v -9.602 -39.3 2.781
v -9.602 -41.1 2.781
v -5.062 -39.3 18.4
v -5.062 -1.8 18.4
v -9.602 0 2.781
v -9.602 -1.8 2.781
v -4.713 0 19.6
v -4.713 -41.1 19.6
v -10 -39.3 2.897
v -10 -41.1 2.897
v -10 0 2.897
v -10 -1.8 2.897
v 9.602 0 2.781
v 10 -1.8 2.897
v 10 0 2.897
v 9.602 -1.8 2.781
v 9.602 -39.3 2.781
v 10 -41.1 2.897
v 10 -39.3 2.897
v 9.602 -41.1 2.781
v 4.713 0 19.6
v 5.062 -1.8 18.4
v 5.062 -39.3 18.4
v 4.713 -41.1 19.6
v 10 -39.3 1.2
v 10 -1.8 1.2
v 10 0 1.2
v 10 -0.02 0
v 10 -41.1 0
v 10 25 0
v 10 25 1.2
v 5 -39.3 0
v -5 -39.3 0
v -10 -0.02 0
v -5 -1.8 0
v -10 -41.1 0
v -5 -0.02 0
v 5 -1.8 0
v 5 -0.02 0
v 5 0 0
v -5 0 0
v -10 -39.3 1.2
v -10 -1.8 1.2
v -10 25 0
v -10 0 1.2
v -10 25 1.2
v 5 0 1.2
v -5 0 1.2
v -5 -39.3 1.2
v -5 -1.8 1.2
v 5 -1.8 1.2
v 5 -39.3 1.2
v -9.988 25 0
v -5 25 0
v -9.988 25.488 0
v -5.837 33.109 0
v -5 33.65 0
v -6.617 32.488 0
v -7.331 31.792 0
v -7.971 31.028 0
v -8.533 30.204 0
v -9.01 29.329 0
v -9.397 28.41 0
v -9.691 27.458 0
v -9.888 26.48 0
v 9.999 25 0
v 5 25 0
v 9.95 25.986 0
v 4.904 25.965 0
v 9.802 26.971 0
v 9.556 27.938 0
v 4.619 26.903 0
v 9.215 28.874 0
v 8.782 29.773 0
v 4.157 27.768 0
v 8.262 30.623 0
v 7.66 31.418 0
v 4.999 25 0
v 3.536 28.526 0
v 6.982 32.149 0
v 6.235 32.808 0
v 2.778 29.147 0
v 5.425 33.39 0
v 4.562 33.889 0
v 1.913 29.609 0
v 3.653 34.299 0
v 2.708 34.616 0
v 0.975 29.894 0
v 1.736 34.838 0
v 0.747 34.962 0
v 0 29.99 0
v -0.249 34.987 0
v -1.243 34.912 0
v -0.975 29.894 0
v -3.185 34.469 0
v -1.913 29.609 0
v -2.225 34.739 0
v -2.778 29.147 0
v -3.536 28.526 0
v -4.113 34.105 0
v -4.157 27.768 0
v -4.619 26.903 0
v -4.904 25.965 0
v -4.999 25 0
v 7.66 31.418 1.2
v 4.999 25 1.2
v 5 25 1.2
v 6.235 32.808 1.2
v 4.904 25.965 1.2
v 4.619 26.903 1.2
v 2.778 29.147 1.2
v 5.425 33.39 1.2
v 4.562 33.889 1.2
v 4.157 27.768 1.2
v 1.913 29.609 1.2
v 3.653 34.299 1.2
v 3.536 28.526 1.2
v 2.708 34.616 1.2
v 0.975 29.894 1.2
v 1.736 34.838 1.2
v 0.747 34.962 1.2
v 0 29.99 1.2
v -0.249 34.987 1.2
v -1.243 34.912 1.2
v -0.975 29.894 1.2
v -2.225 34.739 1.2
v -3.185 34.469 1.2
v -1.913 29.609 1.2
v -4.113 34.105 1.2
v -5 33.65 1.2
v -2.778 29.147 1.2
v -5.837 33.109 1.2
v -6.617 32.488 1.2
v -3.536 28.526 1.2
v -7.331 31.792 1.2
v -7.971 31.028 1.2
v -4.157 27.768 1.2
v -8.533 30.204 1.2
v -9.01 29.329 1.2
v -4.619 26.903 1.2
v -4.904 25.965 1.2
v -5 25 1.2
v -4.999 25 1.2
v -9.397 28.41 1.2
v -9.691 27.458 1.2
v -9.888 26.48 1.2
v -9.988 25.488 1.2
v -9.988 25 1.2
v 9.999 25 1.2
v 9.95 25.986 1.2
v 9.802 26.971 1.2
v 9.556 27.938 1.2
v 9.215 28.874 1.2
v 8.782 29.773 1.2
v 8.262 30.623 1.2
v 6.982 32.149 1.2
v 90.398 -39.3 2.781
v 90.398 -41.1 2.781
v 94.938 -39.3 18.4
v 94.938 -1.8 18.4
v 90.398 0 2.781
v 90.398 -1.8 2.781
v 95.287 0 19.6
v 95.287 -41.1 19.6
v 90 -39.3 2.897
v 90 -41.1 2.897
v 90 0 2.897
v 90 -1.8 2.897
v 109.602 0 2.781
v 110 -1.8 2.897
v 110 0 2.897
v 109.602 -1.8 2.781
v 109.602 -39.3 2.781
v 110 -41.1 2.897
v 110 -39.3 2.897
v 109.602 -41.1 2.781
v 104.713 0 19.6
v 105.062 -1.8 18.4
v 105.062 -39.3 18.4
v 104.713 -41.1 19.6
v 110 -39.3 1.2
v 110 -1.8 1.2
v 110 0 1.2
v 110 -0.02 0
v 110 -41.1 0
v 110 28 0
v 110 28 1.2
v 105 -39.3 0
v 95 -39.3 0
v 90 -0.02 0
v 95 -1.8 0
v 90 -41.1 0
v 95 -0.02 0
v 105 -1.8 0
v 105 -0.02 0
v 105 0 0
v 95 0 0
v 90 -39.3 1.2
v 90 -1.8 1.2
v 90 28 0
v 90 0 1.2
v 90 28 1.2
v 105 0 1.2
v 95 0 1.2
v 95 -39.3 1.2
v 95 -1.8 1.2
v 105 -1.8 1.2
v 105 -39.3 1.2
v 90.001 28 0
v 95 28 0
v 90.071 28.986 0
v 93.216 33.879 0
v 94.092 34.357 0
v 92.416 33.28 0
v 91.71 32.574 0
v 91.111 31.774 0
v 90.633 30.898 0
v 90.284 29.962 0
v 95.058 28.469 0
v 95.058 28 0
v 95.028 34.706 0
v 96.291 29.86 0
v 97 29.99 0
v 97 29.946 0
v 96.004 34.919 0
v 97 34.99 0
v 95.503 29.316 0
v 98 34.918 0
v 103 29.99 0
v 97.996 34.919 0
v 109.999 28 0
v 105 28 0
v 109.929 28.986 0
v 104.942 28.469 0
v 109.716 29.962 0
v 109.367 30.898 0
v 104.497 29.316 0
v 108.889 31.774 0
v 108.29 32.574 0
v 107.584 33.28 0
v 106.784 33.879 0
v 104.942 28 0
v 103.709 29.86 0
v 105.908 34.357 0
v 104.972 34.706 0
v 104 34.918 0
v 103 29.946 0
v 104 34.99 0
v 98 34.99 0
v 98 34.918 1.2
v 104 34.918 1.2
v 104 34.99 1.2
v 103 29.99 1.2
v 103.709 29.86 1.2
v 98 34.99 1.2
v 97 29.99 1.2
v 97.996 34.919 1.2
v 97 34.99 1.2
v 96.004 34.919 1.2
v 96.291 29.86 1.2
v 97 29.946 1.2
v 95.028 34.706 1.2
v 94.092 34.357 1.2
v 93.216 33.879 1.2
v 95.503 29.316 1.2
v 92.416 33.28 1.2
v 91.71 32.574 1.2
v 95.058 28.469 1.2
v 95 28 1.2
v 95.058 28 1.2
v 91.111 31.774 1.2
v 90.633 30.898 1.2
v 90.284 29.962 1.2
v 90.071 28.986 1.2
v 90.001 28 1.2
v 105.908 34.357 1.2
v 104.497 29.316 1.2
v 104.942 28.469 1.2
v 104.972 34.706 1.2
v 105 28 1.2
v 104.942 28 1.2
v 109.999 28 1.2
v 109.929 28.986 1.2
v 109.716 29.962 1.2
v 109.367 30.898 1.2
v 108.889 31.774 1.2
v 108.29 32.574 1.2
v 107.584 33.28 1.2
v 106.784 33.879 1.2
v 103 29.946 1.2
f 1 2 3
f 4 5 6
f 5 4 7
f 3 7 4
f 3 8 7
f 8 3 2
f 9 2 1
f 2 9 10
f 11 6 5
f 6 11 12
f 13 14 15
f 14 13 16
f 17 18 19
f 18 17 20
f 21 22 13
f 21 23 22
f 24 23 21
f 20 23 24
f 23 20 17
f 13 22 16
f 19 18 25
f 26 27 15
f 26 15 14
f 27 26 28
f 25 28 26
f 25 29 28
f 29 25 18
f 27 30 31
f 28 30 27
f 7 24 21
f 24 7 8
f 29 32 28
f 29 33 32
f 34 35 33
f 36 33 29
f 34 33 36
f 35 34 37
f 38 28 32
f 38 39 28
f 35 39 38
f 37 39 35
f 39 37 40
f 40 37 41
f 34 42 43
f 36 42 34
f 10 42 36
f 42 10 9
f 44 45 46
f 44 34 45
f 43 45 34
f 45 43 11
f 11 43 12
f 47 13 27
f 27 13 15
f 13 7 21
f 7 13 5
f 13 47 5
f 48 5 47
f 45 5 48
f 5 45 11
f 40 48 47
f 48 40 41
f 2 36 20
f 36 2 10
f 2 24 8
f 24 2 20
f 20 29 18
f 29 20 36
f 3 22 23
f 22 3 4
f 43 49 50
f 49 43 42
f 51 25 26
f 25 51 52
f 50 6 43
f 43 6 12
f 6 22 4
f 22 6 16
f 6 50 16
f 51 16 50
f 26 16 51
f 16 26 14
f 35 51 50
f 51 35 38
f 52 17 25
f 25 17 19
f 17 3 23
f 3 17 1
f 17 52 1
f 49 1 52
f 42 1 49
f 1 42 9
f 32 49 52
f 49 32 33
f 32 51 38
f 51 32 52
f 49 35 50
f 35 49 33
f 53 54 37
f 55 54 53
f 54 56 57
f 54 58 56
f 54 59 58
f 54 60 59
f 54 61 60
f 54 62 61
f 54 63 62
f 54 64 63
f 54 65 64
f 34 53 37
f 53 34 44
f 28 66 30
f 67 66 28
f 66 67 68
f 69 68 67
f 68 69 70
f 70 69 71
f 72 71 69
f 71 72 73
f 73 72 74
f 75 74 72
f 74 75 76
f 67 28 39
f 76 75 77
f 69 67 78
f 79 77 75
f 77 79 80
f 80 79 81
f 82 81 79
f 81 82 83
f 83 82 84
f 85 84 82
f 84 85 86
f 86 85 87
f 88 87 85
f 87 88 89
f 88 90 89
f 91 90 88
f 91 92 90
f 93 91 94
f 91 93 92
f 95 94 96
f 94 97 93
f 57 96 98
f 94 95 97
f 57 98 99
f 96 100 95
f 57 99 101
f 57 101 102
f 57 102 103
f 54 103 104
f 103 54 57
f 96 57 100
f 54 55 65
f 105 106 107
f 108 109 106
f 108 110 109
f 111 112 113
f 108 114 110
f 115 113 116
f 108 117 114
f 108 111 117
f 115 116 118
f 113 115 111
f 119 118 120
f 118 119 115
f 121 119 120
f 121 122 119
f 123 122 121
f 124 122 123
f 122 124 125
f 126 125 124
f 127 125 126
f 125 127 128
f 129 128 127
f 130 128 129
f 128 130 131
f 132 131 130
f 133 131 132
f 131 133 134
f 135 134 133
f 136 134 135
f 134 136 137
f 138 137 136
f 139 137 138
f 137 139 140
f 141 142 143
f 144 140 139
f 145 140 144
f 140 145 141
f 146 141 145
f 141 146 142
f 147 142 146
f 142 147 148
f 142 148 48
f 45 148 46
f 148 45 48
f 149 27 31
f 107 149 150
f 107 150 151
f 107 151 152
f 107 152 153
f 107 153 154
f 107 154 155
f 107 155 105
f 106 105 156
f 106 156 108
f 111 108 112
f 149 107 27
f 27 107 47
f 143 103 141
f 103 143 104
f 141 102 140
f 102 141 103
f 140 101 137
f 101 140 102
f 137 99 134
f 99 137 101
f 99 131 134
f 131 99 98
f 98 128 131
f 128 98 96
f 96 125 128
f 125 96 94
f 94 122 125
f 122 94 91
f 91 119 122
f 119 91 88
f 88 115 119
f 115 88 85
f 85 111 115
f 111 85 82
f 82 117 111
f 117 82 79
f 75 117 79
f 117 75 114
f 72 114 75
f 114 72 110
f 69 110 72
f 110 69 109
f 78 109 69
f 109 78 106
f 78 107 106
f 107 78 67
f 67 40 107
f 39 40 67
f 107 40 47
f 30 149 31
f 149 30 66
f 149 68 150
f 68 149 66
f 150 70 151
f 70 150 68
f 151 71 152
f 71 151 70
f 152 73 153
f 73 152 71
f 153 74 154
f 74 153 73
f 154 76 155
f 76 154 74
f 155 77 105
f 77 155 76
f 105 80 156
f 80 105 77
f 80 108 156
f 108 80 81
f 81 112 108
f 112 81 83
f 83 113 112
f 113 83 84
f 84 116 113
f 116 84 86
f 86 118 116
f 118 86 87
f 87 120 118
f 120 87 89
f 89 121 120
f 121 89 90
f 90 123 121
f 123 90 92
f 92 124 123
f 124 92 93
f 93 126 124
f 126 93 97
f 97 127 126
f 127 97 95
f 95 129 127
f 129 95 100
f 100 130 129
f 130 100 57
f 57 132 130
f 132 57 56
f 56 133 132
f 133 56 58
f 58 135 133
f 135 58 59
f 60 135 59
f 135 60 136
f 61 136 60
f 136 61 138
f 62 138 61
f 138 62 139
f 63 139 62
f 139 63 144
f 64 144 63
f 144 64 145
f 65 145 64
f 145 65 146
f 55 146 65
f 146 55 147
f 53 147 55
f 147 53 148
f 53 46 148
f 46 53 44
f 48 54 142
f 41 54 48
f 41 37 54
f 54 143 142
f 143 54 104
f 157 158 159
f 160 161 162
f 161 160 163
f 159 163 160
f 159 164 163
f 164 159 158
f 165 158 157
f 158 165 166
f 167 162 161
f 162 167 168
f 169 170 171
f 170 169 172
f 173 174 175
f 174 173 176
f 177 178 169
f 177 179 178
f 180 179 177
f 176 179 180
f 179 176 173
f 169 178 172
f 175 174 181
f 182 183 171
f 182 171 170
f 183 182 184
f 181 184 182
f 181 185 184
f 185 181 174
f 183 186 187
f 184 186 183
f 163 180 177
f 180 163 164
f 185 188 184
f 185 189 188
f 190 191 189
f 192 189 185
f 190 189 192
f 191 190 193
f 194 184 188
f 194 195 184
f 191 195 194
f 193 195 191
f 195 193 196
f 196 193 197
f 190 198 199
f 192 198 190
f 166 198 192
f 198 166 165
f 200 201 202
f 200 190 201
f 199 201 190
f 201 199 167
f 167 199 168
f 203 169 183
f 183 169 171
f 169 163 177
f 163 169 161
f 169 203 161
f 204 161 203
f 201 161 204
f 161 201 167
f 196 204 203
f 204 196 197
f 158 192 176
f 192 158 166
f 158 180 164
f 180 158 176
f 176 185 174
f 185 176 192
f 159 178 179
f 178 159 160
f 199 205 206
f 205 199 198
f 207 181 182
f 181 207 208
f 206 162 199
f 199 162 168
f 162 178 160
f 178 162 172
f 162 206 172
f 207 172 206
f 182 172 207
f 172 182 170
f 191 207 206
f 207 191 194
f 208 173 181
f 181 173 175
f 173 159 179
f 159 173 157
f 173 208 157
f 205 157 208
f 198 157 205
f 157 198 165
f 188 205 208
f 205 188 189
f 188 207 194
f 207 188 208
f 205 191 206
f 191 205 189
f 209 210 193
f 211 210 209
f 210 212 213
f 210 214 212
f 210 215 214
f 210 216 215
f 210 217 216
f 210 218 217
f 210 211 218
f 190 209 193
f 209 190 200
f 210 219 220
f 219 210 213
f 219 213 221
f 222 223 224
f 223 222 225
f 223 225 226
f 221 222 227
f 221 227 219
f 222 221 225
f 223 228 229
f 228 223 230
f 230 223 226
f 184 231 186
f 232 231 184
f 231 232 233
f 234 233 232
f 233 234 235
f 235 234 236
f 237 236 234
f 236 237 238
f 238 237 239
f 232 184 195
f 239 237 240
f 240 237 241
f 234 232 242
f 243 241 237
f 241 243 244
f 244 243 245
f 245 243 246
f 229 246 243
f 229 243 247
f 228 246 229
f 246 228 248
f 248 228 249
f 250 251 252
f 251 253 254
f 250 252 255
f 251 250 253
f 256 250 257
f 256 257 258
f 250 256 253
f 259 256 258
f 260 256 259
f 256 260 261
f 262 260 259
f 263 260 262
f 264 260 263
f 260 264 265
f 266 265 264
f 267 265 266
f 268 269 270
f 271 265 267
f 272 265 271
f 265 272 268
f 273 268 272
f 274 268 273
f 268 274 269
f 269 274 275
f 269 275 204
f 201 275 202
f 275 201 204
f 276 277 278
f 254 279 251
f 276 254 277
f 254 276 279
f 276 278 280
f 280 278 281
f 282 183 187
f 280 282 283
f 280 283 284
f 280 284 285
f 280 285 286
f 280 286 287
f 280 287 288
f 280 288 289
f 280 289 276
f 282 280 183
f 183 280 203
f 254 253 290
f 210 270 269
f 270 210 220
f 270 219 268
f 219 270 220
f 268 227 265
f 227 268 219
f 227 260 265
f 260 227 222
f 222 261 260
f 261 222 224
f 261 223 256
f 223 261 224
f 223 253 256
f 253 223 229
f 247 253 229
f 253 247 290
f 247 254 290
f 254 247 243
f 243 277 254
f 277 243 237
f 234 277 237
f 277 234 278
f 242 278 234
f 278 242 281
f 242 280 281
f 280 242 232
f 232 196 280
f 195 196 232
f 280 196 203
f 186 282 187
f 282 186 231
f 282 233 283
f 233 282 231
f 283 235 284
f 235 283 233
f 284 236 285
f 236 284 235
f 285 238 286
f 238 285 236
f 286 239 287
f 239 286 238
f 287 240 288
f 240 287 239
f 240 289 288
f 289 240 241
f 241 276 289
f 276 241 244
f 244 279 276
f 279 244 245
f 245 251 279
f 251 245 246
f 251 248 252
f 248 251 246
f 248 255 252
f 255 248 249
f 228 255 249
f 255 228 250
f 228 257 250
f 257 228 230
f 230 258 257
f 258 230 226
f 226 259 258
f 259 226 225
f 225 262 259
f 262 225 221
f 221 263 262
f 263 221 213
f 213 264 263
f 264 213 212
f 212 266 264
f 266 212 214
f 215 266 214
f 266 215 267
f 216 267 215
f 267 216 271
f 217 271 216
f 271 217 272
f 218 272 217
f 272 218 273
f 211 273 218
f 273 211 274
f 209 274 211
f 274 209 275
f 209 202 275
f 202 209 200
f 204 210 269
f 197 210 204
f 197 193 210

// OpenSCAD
// -*- mode: SCAD ; c-file-style: "ellemtel" ; coding: utf-8 -*-
//
// NN
//
// © 2018–2019 Roland Sieker <ospalh@gmail.com>
// Licence: CC-BY-SA 4.0

/* [Global] */

// … to preview. You will get all parts as separate STLs when you click “Create Thing”.
part = "s"; // [s: Set, a: Part A, b: Part B, st: Stack]

// Set this to “render” and click on “Create Thing” when done with the setup.
preview = 1; // [0:render, 1:preview]

/* [Sizes] */

// Höhe der Latte
size_x = 37.5;  // [1:0.1:40]

// Tiefe der Latte
size_y = 17.2;  // [1:0.1:40]

// Abstand Latte-Haken
hly = 30;  // [1:0.1:40]

/* [Hidden] */

pw = 5;
pg = 10;
pr1 = pg/2;
pr2 = 2;

exl=hly-2*pw-pg;

// Done with the customizer

// *******************************************************
// Extra parameters. These can be changed reasonably safely.


w = 1.8;  // Wall width
p = 1.2;  // Bottom, top plate hight
c = 0.4;  // Clearance
angle = 60; // Overhangs much below 60° are a problem for me

// *******************************************************
// Some shortcuts. These shouldn’t be changed


module kmirror(maxis=[1, 0, 0])
{
   // Keep *and* mirror an object. Standard is left and right mirroring.
   children();
   mirror(maxis)
   {
      children();
   }
}

tau = 2 * PI;  // π is still wrong. τ = circumference / r

xy_factor = 1/tan(angle);
// To get from a hight to a horizontal width inclined correctly
z_factor = tan(angle);  // The other way around


some_distance = 100;
ms = 0.01;  // Muggeseggele.

// fn for differently sized objects and fs, fa; all for preview or rendering.
pna = 40;
pnb = 15;
pa = 5;
ps = 1;
rna = 180;
rnb = 30;
ra = 2;
rs = 0.25;
function na() = (preview) ? pna : rna;
function nb() = (preview) ? pnb : rnb;
$fs = (preview) ? ps : rs;
$fa = (preview) ? pa : ra;

// *******************************************************
// End setup



// *******************************************************
// Generate the parts

print_part();


if ("s" == part)
{
   preview_parts();
}

if ("st" == part)
{
   // Use "st" during development
   stack_parts();
}

module print_part()
{
   if ("a" == part)
   {
      part_a();
   }
   if ("b" == part)
   {
      part_b();
   }
}

module preview_parts()
{
   part_a();
   translate([some_distance, 0, 0])
   {
      part_b();
   }
}

module stack_parts()
{
   // intersection()
   {
      color("yellow")
      {
         part_a();
      }
      // translate([0,0,30])
      rotate([0,180,0])
      {
         color("red")
         {
            part_b();
         }
      }
   }
}

// *******************************************************
// Code for the parts themselves


module part_a()
{
   rahmen();
   linear_extrude(p)
   {
      translate([0,-ms,0])
         hanger_a();
   }
}

module part_b()
{
   rahmen();
   linear_extrude(p)
   {
      translate([0,-ms,0])
         hanger_b();
   }
}


module rahmen()
{
   translate([-pw -pg/2, -w-size_x, p])
      difference()
      {
         translate([0,-w,-p])
            cube([2*pw+pg, 2*w+size_x,2*p+size_y]);
         translate([-ms,0,0])
            cube([2*pw+pg+2*ms, size_x,size_y]);
         translate([pw,0,-ms-p])
            cube([pg, size_x, p+2*ms]);
         translate([pw+pg/2,-w-ms,-p-ms])
         kmirror()
         {
            rotate([0,atan(pw/(size_y)),0])
            translate([-pw-pg/2-20,0,0])
               cube([20,100,100]);
         }
      }
}


module hanger_a()
{
   difference()
   {
      union()
      {
         translate([-pw-pg/2, -ms])
            square([2*pw+pg,pw+pg+exl+2*ms]);
         translate([0,pw+pg+exl])
            circle(r=pw+pr1);
      }
      translate([0,pw+pg+exl])
         circle(r=pr1);
         translate([-pr1, -ms])
            square([pg,pw+pg+exl+2*ms]);
   }
}


module hanger_b()
{
   drr=pr1-pr2;
   difference()
   {
      union()
      {
         translate([-pw-pg/2, -ms])
            square([2*pw+pg,pw+pg+2*ms+drr+exl]);
         kmirror()
            translate([-drr,pw+pg+drr+exl])
         {

            circle(r=pw+pr2);
         }
         translate([-pg/2+drr,pg+2*pw+exl])
            square([2*drr, pw]);

      }
      translate([0,pw+pg+exl])
         kmirror()
         translate([-drr,+drr])
         {

           circle(r=pr2);
         }
         circle(r=pr1);
         translate([-pr1, -ms])
            square([pg,pw+pg+2*ms+drr+exl]);
           translate([-drr, pg+pw+exl])
            square([2*drr, pw]);
   }
}


module holepair(y)
{
   translate([0,y])
      {
         translate([-20,0])
            circle(r=3);
         translate([20,0])
            circle(r=3);
      }
}
